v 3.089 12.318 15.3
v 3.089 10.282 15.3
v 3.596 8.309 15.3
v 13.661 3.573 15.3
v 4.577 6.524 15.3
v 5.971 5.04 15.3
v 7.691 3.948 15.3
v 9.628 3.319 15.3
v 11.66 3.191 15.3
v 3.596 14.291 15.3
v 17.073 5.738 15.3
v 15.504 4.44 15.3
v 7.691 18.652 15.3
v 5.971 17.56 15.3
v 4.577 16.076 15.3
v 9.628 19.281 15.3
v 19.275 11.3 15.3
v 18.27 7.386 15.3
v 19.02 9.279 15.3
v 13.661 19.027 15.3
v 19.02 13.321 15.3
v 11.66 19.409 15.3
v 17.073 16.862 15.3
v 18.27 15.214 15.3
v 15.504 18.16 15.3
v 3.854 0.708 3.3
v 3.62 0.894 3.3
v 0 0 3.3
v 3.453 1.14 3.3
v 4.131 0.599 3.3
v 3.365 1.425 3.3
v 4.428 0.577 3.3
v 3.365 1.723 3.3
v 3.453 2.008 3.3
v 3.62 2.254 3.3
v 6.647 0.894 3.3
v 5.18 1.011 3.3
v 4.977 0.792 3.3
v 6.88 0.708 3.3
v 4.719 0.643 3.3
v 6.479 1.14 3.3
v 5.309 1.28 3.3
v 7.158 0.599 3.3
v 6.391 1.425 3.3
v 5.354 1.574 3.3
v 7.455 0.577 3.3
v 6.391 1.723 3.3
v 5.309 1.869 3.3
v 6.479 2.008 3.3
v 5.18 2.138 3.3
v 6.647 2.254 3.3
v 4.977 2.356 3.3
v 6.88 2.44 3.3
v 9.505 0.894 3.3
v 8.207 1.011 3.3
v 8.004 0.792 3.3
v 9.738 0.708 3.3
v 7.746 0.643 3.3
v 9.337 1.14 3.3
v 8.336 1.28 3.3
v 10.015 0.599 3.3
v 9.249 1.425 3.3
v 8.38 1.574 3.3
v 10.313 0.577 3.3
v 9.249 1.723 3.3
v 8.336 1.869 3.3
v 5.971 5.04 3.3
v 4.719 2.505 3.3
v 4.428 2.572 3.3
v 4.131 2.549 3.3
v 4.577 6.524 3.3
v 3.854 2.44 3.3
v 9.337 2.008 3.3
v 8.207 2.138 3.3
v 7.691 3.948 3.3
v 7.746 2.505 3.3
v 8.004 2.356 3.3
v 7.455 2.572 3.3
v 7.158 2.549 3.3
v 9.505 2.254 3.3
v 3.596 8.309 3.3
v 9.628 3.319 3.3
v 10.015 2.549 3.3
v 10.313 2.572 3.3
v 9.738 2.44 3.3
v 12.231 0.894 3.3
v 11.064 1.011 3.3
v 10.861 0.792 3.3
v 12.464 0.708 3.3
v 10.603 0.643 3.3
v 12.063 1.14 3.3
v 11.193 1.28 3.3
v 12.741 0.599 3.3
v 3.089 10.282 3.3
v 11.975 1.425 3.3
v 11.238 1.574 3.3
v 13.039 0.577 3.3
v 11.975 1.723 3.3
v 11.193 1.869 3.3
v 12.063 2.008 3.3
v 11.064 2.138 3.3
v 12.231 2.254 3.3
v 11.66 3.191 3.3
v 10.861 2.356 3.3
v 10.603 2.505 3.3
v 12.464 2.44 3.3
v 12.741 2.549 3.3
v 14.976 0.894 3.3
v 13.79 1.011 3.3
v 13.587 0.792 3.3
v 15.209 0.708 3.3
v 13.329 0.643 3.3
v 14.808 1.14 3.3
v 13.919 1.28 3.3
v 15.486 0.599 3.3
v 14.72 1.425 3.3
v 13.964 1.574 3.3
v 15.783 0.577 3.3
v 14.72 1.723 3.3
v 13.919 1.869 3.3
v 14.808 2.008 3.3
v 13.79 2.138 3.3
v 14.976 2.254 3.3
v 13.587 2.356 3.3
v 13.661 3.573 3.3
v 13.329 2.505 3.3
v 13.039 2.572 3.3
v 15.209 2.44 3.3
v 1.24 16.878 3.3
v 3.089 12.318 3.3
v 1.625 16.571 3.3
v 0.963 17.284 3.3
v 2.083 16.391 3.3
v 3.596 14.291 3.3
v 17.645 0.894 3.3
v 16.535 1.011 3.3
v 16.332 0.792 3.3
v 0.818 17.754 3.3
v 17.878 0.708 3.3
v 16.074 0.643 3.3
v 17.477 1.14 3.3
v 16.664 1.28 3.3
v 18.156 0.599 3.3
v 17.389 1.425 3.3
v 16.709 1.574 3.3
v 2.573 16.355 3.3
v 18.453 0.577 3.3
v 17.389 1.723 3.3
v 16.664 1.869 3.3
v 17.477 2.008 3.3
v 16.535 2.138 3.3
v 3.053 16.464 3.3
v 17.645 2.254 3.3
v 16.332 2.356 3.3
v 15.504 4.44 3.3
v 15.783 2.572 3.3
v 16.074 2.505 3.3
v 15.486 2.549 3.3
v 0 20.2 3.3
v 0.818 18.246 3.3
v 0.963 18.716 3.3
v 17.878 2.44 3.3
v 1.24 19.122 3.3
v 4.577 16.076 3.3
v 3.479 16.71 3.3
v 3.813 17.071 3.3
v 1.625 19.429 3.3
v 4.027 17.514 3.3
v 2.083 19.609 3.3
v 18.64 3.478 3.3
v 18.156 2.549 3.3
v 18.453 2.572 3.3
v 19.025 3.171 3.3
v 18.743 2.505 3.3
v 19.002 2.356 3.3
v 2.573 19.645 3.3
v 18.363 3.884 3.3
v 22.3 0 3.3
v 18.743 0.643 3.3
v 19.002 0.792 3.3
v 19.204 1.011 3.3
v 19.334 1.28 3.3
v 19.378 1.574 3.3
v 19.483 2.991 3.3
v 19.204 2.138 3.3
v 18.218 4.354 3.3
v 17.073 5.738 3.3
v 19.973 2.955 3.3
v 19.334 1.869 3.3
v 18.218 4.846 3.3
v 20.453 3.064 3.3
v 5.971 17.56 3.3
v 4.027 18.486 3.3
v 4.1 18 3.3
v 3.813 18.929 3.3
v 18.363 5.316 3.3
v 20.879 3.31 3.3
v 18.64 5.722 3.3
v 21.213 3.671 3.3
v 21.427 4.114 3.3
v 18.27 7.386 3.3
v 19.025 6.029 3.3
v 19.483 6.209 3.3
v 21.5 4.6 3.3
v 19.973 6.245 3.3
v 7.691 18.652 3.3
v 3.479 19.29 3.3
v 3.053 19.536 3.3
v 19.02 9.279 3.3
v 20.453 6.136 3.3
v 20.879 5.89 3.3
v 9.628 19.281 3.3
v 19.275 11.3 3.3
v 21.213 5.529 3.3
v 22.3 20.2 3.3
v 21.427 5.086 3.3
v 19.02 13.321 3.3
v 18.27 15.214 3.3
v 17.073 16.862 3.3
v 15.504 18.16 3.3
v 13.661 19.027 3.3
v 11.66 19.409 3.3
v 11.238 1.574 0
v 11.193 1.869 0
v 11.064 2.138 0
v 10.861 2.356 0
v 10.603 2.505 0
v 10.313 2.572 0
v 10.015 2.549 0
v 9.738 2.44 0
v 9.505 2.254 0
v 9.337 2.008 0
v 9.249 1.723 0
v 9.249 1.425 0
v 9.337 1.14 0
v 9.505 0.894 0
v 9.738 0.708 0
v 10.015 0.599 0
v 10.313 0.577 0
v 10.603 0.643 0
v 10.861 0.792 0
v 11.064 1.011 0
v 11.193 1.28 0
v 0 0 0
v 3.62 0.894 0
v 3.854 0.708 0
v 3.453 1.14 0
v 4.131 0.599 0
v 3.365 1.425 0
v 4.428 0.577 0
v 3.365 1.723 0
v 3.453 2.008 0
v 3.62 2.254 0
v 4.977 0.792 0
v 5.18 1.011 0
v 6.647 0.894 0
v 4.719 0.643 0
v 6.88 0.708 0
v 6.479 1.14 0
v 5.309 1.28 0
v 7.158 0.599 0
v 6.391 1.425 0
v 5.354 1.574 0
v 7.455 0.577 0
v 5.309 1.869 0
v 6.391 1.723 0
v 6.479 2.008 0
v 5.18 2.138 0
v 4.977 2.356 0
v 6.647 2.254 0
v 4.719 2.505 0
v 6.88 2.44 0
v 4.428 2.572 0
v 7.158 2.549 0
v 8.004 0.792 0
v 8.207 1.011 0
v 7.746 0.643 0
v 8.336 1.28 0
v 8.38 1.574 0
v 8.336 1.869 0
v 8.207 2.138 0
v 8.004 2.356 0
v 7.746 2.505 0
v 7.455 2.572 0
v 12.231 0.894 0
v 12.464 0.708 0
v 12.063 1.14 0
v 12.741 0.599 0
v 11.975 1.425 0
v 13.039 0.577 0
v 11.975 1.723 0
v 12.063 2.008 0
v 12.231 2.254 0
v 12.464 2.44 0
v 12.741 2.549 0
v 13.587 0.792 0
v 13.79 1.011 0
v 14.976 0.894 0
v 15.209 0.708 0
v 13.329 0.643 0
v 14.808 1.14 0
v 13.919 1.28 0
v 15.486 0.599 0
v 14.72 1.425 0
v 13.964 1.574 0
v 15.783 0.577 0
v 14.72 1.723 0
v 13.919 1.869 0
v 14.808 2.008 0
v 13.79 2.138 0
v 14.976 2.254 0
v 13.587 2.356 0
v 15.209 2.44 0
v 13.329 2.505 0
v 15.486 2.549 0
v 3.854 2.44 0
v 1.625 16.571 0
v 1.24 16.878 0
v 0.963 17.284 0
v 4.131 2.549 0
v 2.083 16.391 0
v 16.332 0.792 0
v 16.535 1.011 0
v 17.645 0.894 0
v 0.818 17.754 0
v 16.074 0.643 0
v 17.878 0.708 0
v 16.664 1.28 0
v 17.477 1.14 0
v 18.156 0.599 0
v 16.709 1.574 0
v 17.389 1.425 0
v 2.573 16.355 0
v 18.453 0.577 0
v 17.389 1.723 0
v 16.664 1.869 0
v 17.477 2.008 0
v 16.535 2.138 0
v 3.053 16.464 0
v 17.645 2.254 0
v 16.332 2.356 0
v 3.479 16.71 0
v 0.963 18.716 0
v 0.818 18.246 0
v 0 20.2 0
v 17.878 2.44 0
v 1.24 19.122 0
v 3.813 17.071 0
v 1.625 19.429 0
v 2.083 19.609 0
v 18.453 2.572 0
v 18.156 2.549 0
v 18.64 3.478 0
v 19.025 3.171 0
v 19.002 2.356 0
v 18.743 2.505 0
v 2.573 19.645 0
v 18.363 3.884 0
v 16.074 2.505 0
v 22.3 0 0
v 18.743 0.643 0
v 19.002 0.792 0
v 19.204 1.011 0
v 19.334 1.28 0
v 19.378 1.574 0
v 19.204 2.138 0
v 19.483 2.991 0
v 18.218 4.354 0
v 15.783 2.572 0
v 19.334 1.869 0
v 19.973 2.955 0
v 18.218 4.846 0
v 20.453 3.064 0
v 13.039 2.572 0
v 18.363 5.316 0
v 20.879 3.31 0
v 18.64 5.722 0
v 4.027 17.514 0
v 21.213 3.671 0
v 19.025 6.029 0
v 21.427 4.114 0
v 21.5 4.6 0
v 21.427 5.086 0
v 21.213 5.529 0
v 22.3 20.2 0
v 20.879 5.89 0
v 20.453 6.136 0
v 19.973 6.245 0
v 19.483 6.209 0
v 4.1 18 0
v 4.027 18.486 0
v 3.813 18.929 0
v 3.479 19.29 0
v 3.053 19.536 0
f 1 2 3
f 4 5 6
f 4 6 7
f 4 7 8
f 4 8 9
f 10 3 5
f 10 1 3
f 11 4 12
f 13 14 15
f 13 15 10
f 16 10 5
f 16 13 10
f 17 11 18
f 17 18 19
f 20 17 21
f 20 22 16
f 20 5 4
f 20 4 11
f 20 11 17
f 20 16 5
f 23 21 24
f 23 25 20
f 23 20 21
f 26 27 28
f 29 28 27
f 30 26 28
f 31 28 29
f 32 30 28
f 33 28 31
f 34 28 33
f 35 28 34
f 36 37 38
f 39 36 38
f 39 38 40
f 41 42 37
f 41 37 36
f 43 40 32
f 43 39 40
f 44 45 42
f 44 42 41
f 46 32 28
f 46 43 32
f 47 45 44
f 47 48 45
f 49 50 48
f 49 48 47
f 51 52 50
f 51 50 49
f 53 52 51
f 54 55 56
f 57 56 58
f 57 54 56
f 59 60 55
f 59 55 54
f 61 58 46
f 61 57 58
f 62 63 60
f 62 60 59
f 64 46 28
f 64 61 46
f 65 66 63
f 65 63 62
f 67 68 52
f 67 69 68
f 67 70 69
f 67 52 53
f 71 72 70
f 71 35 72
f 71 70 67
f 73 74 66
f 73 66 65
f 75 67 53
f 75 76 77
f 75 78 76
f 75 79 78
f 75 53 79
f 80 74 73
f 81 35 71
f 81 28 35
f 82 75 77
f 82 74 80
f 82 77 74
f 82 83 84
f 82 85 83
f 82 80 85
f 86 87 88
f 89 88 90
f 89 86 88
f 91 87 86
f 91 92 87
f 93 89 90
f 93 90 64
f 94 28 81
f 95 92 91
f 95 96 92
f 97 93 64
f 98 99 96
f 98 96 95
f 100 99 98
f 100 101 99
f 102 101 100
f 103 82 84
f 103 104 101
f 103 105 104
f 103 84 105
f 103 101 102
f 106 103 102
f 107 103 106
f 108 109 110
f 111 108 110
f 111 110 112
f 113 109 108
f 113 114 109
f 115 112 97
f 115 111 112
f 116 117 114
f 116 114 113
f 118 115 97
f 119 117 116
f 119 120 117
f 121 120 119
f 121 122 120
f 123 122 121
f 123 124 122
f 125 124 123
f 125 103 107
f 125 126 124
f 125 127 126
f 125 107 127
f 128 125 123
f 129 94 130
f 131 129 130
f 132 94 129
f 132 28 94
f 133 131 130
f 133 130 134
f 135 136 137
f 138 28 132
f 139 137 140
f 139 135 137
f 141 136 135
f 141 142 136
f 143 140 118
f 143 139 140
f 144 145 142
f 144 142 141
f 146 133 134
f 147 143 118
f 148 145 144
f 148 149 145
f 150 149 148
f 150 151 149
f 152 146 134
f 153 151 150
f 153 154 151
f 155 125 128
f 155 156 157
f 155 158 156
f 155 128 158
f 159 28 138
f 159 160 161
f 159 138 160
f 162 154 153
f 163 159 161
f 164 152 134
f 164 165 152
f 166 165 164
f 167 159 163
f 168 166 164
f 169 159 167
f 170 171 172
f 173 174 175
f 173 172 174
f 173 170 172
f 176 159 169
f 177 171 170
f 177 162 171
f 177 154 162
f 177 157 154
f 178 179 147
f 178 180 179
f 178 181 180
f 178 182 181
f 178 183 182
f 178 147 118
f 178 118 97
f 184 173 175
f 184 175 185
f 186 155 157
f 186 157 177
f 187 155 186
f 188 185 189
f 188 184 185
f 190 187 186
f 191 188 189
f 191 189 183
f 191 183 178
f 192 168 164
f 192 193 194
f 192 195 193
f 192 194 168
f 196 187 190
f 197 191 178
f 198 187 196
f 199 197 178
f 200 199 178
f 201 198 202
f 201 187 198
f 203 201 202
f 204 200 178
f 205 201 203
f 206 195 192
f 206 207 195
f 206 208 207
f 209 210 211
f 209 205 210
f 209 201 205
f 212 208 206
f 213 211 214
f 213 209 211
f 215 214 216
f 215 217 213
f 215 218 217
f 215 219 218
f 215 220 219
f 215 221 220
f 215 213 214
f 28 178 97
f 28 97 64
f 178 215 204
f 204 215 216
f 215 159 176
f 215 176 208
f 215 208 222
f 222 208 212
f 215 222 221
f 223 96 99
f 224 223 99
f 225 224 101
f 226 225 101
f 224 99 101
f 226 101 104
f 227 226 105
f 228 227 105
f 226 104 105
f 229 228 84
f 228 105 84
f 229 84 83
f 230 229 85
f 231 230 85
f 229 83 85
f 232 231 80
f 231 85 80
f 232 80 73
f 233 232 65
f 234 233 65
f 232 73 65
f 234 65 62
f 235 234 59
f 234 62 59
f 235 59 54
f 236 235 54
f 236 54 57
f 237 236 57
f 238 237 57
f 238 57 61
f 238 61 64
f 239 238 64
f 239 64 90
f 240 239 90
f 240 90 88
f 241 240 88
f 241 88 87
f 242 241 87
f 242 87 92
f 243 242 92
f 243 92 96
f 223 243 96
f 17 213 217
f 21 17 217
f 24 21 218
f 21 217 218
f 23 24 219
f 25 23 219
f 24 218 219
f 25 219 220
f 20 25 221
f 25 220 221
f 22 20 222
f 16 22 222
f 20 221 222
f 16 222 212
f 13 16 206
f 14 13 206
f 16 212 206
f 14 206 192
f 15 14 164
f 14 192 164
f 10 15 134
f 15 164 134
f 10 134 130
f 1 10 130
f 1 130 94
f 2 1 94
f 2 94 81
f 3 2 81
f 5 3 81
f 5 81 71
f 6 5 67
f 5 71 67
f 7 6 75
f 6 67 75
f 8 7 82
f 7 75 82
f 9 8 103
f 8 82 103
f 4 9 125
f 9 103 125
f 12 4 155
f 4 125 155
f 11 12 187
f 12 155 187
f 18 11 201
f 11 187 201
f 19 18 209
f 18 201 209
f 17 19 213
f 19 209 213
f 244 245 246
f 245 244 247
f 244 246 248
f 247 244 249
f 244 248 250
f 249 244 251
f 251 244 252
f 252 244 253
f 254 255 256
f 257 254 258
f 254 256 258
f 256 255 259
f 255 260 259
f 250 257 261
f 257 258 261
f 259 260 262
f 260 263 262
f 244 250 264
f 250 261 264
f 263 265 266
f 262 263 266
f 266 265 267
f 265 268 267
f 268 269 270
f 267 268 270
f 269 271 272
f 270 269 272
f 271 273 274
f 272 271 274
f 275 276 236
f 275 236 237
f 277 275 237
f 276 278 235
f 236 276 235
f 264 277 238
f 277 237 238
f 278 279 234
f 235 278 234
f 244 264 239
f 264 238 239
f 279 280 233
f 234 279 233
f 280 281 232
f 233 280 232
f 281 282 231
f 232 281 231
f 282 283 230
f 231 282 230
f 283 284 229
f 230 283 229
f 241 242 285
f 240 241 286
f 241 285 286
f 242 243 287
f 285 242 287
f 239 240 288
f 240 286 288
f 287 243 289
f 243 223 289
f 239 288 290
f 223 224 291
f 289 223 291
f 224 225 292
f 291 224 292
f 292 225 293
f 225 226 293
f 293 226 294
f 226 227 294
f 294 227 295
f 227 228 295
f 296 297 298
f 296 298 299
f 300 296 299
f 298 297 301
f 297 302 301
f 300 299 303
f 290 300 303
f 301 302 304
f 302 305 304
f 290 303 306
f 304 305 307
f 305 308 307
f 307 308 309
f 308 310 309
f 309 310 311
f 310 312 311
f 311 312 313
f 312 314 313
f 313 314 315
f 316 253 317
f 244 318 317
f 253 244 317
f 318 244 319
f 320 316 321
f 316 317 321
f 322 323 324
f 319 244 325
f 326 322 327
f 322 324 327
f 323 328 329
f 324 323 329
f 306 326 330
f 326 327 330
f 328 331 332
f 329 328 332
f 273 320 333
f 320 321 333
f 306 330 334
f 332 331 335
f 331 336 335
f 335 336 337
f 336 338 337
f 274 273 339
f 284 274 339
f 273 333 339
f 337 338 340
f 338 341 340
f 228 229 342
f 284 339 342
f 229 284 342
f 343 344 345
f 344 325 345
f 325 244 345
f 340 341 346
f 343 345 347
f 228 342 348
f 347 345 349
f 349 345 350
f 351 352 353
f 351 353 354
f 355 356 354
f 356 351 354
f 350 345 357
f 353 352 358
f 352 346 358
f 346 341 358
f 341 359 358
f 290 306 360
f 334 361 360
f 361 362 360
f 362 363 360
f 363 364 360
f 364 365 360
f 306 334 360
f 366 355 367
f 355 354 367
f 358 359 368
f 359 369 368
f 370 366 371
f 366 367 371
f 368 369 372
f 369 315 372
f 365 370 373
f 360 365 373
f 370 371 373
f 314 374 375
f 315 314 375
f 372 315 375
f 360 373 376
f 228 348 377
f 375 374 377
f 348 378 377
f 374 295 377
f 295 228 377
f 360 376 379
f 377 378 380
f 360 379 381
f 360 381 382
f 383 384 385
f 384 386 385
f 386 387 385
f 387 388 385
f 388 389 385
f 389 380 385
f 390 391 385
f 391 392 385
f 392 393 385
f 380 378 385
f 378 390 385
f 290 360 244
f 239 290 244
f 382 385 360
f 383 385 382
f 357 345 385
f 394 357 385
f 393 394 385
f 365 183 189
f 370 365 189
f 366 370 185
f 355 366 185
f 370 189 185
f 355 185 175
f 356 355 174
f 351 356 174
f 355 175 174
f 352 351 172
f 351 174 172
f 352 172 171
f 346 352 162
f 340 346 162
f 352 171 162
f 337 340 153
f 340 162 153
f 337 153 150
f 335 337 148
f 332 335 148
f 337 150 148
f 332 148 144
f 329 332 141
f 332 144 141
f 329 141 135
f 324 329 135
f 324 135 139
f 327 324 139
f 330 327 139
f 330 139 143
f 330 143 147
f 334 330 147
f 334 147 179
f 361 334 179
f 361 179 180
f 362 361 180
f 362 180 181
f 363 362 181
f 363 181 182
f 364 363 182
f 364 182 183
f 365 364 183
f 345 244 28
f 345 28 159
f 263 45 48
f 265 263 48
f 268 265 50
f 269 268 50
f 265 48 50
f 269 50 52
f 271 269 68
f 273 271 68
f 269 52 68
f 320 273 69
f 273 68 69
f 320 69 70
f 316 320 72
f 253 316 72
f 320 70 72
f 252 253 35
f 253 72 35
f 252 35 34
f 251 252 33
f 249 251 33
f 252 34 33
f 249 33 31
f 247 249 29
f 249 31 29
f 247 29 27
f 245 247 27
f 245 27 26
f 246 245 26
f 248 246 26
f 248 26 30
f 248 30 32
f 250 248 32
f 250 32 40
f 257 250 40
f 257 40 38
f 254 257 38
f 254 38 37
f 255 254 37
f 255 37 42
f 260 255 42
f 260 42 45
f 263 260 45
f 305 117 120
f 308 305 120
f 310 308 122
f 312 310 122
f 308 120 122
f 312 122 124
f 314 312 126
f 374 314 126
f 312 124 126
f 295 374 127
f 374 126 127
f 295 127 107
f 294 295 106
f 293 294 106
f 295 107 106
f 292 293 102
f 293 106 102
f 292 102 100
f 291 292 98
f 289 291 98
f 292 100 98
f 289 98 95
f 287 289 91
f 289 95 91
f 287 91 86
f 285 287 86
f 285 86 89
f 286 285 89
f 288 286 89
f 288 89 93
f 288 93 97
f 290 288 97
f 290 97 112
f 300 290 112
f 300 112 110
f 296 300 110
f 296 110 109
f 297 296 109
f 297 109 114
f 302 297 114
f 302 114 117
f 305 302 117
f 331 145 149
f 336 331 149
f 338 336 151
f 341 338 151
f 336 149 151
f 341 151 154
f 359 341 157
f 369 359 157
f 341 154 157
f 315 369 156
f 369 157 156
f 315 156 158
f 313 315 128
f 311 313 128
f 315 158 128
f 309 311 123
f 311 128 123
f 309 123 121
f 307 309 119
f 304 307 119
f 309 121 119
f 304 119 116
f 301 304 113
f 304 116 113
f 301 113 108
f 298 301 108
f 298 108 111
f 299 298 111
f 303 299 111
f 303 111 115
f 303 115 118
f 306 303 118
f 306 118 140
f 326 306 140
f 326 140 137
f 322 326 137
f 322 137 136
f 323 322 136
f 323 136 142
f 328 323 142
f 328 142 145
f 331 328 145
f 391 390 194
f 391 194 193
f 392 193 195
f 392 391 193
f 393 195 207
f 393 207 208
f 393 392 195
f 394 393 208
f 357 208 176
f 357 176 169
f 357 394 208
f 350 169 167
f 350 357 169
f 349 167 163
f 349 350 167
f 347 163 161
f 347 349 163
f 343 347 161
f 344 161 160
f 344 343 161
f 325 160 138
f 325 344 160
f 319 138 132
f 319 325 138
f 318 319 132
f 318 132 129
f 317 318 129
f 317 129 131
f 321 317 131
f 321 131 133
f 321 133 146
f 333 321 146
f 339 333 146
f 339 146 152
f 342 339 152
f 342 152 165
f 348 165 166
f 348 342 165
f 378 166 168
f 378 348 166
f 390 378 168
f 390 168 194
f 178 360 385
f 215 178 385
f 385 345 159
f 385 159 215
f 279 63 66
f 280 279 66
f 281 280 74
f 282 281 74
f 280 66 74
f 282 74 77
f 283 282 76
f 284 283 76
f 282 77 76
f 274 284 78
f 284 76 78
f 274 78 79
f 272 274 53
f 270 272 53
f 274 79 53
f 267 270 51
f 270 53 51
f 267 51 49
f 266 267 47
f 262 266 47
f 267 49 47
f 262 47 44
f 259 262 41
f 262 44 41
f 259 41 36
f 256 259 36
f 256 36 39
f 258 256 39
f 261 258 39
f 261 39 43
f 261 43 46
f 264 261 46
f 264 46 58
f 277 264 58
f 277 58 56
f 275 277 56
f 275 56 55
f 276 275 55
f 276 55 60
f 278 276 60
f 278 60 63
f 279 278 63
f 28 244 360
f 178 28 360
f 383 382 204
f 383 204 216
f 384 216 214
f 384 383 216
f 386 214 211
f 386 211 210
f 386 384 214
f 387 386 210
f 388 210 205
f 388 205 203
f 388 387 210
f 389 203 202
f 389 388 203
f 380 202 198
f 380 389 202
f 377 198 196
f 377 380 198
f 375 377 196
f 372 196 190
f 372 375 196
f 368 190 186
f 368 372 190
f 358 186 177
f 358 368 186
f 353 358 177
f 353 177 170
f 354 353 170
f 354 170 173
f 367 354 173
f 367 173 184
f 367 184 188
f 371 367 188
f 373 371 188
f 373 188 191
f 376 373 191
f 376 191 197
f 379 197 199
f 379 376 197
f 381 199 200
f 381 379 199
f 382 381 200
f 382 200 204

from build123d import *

# Parameters (mm, degrees)
SKETCH1_W           = 22.3
SKETCH1_H           = 20.2
SKETCH1_R           = 1.65
BOSS_EXTRUDE1_DEPTH = 3.3
SKETCH2_R           = 8.125
BOSS_EXTRUDE2_DEPTH = 12
SKETCH2_3_R         = 1
CUT_EXTRUDE1_DEPTH  = 12


with BuildPart() as part:
    # Sketch1 → Boss-Extrude1 (new body)
    with BuildSketch(Plane.XY):
        with Locations((11.15, 10.1)):
            Rectangle(SKETCH1_W, SKETCH1_H)
        with Locations((2.45, 18)):
            Circle(SKETCH1_R, mode=Mode.SUBTRACT)
        with Locations((19.85, 4.6)):
            Circle(SKETCH1_R, mode=Mode.SUBTRACT)
    extrude(amount=BOSS_EXTRUDE1_DEPTH)

    # Sketch2 → Boss-Extrude2 (add)
    with BuildSketch(Plane.XY.offset(3.3)):
        with Locations((11.15, 11.3)):
            Circle(SKETCH2_R)
    extrude(amount=BOSS_EXTRUDE2_DEPTH)

    # Sketch2<3> → Cut-Extrude1 (cut)
    with BuildSketch(Plane.XY.offset(3.3)):
        with Locations((4.353511594, 1.574306631)):
            Circle(SKETCH2_3_R)
        with Locations((7.380273739, 1.574306631)):
            Circle(SKETCH2_3_R)
        with Locations((10.237837999, 1.574306631)):
            Circle(SKETCH2_3_R)
        with Locations((12.963803906, 1.574306631)):
            Circle(SKETCH2_3_R)
        with Locations((15.708569577, 1.574306631)):
            Circle(SKETCH2_3_R)
        with Locations((18.378136189, 1.574306631)):
            Circle(SKETCH2_3_R)
    extrude(amount=-CUT_EXTRUDE1_DEPTH, mode=Mode.SUBTRACT)


solid = part.part
